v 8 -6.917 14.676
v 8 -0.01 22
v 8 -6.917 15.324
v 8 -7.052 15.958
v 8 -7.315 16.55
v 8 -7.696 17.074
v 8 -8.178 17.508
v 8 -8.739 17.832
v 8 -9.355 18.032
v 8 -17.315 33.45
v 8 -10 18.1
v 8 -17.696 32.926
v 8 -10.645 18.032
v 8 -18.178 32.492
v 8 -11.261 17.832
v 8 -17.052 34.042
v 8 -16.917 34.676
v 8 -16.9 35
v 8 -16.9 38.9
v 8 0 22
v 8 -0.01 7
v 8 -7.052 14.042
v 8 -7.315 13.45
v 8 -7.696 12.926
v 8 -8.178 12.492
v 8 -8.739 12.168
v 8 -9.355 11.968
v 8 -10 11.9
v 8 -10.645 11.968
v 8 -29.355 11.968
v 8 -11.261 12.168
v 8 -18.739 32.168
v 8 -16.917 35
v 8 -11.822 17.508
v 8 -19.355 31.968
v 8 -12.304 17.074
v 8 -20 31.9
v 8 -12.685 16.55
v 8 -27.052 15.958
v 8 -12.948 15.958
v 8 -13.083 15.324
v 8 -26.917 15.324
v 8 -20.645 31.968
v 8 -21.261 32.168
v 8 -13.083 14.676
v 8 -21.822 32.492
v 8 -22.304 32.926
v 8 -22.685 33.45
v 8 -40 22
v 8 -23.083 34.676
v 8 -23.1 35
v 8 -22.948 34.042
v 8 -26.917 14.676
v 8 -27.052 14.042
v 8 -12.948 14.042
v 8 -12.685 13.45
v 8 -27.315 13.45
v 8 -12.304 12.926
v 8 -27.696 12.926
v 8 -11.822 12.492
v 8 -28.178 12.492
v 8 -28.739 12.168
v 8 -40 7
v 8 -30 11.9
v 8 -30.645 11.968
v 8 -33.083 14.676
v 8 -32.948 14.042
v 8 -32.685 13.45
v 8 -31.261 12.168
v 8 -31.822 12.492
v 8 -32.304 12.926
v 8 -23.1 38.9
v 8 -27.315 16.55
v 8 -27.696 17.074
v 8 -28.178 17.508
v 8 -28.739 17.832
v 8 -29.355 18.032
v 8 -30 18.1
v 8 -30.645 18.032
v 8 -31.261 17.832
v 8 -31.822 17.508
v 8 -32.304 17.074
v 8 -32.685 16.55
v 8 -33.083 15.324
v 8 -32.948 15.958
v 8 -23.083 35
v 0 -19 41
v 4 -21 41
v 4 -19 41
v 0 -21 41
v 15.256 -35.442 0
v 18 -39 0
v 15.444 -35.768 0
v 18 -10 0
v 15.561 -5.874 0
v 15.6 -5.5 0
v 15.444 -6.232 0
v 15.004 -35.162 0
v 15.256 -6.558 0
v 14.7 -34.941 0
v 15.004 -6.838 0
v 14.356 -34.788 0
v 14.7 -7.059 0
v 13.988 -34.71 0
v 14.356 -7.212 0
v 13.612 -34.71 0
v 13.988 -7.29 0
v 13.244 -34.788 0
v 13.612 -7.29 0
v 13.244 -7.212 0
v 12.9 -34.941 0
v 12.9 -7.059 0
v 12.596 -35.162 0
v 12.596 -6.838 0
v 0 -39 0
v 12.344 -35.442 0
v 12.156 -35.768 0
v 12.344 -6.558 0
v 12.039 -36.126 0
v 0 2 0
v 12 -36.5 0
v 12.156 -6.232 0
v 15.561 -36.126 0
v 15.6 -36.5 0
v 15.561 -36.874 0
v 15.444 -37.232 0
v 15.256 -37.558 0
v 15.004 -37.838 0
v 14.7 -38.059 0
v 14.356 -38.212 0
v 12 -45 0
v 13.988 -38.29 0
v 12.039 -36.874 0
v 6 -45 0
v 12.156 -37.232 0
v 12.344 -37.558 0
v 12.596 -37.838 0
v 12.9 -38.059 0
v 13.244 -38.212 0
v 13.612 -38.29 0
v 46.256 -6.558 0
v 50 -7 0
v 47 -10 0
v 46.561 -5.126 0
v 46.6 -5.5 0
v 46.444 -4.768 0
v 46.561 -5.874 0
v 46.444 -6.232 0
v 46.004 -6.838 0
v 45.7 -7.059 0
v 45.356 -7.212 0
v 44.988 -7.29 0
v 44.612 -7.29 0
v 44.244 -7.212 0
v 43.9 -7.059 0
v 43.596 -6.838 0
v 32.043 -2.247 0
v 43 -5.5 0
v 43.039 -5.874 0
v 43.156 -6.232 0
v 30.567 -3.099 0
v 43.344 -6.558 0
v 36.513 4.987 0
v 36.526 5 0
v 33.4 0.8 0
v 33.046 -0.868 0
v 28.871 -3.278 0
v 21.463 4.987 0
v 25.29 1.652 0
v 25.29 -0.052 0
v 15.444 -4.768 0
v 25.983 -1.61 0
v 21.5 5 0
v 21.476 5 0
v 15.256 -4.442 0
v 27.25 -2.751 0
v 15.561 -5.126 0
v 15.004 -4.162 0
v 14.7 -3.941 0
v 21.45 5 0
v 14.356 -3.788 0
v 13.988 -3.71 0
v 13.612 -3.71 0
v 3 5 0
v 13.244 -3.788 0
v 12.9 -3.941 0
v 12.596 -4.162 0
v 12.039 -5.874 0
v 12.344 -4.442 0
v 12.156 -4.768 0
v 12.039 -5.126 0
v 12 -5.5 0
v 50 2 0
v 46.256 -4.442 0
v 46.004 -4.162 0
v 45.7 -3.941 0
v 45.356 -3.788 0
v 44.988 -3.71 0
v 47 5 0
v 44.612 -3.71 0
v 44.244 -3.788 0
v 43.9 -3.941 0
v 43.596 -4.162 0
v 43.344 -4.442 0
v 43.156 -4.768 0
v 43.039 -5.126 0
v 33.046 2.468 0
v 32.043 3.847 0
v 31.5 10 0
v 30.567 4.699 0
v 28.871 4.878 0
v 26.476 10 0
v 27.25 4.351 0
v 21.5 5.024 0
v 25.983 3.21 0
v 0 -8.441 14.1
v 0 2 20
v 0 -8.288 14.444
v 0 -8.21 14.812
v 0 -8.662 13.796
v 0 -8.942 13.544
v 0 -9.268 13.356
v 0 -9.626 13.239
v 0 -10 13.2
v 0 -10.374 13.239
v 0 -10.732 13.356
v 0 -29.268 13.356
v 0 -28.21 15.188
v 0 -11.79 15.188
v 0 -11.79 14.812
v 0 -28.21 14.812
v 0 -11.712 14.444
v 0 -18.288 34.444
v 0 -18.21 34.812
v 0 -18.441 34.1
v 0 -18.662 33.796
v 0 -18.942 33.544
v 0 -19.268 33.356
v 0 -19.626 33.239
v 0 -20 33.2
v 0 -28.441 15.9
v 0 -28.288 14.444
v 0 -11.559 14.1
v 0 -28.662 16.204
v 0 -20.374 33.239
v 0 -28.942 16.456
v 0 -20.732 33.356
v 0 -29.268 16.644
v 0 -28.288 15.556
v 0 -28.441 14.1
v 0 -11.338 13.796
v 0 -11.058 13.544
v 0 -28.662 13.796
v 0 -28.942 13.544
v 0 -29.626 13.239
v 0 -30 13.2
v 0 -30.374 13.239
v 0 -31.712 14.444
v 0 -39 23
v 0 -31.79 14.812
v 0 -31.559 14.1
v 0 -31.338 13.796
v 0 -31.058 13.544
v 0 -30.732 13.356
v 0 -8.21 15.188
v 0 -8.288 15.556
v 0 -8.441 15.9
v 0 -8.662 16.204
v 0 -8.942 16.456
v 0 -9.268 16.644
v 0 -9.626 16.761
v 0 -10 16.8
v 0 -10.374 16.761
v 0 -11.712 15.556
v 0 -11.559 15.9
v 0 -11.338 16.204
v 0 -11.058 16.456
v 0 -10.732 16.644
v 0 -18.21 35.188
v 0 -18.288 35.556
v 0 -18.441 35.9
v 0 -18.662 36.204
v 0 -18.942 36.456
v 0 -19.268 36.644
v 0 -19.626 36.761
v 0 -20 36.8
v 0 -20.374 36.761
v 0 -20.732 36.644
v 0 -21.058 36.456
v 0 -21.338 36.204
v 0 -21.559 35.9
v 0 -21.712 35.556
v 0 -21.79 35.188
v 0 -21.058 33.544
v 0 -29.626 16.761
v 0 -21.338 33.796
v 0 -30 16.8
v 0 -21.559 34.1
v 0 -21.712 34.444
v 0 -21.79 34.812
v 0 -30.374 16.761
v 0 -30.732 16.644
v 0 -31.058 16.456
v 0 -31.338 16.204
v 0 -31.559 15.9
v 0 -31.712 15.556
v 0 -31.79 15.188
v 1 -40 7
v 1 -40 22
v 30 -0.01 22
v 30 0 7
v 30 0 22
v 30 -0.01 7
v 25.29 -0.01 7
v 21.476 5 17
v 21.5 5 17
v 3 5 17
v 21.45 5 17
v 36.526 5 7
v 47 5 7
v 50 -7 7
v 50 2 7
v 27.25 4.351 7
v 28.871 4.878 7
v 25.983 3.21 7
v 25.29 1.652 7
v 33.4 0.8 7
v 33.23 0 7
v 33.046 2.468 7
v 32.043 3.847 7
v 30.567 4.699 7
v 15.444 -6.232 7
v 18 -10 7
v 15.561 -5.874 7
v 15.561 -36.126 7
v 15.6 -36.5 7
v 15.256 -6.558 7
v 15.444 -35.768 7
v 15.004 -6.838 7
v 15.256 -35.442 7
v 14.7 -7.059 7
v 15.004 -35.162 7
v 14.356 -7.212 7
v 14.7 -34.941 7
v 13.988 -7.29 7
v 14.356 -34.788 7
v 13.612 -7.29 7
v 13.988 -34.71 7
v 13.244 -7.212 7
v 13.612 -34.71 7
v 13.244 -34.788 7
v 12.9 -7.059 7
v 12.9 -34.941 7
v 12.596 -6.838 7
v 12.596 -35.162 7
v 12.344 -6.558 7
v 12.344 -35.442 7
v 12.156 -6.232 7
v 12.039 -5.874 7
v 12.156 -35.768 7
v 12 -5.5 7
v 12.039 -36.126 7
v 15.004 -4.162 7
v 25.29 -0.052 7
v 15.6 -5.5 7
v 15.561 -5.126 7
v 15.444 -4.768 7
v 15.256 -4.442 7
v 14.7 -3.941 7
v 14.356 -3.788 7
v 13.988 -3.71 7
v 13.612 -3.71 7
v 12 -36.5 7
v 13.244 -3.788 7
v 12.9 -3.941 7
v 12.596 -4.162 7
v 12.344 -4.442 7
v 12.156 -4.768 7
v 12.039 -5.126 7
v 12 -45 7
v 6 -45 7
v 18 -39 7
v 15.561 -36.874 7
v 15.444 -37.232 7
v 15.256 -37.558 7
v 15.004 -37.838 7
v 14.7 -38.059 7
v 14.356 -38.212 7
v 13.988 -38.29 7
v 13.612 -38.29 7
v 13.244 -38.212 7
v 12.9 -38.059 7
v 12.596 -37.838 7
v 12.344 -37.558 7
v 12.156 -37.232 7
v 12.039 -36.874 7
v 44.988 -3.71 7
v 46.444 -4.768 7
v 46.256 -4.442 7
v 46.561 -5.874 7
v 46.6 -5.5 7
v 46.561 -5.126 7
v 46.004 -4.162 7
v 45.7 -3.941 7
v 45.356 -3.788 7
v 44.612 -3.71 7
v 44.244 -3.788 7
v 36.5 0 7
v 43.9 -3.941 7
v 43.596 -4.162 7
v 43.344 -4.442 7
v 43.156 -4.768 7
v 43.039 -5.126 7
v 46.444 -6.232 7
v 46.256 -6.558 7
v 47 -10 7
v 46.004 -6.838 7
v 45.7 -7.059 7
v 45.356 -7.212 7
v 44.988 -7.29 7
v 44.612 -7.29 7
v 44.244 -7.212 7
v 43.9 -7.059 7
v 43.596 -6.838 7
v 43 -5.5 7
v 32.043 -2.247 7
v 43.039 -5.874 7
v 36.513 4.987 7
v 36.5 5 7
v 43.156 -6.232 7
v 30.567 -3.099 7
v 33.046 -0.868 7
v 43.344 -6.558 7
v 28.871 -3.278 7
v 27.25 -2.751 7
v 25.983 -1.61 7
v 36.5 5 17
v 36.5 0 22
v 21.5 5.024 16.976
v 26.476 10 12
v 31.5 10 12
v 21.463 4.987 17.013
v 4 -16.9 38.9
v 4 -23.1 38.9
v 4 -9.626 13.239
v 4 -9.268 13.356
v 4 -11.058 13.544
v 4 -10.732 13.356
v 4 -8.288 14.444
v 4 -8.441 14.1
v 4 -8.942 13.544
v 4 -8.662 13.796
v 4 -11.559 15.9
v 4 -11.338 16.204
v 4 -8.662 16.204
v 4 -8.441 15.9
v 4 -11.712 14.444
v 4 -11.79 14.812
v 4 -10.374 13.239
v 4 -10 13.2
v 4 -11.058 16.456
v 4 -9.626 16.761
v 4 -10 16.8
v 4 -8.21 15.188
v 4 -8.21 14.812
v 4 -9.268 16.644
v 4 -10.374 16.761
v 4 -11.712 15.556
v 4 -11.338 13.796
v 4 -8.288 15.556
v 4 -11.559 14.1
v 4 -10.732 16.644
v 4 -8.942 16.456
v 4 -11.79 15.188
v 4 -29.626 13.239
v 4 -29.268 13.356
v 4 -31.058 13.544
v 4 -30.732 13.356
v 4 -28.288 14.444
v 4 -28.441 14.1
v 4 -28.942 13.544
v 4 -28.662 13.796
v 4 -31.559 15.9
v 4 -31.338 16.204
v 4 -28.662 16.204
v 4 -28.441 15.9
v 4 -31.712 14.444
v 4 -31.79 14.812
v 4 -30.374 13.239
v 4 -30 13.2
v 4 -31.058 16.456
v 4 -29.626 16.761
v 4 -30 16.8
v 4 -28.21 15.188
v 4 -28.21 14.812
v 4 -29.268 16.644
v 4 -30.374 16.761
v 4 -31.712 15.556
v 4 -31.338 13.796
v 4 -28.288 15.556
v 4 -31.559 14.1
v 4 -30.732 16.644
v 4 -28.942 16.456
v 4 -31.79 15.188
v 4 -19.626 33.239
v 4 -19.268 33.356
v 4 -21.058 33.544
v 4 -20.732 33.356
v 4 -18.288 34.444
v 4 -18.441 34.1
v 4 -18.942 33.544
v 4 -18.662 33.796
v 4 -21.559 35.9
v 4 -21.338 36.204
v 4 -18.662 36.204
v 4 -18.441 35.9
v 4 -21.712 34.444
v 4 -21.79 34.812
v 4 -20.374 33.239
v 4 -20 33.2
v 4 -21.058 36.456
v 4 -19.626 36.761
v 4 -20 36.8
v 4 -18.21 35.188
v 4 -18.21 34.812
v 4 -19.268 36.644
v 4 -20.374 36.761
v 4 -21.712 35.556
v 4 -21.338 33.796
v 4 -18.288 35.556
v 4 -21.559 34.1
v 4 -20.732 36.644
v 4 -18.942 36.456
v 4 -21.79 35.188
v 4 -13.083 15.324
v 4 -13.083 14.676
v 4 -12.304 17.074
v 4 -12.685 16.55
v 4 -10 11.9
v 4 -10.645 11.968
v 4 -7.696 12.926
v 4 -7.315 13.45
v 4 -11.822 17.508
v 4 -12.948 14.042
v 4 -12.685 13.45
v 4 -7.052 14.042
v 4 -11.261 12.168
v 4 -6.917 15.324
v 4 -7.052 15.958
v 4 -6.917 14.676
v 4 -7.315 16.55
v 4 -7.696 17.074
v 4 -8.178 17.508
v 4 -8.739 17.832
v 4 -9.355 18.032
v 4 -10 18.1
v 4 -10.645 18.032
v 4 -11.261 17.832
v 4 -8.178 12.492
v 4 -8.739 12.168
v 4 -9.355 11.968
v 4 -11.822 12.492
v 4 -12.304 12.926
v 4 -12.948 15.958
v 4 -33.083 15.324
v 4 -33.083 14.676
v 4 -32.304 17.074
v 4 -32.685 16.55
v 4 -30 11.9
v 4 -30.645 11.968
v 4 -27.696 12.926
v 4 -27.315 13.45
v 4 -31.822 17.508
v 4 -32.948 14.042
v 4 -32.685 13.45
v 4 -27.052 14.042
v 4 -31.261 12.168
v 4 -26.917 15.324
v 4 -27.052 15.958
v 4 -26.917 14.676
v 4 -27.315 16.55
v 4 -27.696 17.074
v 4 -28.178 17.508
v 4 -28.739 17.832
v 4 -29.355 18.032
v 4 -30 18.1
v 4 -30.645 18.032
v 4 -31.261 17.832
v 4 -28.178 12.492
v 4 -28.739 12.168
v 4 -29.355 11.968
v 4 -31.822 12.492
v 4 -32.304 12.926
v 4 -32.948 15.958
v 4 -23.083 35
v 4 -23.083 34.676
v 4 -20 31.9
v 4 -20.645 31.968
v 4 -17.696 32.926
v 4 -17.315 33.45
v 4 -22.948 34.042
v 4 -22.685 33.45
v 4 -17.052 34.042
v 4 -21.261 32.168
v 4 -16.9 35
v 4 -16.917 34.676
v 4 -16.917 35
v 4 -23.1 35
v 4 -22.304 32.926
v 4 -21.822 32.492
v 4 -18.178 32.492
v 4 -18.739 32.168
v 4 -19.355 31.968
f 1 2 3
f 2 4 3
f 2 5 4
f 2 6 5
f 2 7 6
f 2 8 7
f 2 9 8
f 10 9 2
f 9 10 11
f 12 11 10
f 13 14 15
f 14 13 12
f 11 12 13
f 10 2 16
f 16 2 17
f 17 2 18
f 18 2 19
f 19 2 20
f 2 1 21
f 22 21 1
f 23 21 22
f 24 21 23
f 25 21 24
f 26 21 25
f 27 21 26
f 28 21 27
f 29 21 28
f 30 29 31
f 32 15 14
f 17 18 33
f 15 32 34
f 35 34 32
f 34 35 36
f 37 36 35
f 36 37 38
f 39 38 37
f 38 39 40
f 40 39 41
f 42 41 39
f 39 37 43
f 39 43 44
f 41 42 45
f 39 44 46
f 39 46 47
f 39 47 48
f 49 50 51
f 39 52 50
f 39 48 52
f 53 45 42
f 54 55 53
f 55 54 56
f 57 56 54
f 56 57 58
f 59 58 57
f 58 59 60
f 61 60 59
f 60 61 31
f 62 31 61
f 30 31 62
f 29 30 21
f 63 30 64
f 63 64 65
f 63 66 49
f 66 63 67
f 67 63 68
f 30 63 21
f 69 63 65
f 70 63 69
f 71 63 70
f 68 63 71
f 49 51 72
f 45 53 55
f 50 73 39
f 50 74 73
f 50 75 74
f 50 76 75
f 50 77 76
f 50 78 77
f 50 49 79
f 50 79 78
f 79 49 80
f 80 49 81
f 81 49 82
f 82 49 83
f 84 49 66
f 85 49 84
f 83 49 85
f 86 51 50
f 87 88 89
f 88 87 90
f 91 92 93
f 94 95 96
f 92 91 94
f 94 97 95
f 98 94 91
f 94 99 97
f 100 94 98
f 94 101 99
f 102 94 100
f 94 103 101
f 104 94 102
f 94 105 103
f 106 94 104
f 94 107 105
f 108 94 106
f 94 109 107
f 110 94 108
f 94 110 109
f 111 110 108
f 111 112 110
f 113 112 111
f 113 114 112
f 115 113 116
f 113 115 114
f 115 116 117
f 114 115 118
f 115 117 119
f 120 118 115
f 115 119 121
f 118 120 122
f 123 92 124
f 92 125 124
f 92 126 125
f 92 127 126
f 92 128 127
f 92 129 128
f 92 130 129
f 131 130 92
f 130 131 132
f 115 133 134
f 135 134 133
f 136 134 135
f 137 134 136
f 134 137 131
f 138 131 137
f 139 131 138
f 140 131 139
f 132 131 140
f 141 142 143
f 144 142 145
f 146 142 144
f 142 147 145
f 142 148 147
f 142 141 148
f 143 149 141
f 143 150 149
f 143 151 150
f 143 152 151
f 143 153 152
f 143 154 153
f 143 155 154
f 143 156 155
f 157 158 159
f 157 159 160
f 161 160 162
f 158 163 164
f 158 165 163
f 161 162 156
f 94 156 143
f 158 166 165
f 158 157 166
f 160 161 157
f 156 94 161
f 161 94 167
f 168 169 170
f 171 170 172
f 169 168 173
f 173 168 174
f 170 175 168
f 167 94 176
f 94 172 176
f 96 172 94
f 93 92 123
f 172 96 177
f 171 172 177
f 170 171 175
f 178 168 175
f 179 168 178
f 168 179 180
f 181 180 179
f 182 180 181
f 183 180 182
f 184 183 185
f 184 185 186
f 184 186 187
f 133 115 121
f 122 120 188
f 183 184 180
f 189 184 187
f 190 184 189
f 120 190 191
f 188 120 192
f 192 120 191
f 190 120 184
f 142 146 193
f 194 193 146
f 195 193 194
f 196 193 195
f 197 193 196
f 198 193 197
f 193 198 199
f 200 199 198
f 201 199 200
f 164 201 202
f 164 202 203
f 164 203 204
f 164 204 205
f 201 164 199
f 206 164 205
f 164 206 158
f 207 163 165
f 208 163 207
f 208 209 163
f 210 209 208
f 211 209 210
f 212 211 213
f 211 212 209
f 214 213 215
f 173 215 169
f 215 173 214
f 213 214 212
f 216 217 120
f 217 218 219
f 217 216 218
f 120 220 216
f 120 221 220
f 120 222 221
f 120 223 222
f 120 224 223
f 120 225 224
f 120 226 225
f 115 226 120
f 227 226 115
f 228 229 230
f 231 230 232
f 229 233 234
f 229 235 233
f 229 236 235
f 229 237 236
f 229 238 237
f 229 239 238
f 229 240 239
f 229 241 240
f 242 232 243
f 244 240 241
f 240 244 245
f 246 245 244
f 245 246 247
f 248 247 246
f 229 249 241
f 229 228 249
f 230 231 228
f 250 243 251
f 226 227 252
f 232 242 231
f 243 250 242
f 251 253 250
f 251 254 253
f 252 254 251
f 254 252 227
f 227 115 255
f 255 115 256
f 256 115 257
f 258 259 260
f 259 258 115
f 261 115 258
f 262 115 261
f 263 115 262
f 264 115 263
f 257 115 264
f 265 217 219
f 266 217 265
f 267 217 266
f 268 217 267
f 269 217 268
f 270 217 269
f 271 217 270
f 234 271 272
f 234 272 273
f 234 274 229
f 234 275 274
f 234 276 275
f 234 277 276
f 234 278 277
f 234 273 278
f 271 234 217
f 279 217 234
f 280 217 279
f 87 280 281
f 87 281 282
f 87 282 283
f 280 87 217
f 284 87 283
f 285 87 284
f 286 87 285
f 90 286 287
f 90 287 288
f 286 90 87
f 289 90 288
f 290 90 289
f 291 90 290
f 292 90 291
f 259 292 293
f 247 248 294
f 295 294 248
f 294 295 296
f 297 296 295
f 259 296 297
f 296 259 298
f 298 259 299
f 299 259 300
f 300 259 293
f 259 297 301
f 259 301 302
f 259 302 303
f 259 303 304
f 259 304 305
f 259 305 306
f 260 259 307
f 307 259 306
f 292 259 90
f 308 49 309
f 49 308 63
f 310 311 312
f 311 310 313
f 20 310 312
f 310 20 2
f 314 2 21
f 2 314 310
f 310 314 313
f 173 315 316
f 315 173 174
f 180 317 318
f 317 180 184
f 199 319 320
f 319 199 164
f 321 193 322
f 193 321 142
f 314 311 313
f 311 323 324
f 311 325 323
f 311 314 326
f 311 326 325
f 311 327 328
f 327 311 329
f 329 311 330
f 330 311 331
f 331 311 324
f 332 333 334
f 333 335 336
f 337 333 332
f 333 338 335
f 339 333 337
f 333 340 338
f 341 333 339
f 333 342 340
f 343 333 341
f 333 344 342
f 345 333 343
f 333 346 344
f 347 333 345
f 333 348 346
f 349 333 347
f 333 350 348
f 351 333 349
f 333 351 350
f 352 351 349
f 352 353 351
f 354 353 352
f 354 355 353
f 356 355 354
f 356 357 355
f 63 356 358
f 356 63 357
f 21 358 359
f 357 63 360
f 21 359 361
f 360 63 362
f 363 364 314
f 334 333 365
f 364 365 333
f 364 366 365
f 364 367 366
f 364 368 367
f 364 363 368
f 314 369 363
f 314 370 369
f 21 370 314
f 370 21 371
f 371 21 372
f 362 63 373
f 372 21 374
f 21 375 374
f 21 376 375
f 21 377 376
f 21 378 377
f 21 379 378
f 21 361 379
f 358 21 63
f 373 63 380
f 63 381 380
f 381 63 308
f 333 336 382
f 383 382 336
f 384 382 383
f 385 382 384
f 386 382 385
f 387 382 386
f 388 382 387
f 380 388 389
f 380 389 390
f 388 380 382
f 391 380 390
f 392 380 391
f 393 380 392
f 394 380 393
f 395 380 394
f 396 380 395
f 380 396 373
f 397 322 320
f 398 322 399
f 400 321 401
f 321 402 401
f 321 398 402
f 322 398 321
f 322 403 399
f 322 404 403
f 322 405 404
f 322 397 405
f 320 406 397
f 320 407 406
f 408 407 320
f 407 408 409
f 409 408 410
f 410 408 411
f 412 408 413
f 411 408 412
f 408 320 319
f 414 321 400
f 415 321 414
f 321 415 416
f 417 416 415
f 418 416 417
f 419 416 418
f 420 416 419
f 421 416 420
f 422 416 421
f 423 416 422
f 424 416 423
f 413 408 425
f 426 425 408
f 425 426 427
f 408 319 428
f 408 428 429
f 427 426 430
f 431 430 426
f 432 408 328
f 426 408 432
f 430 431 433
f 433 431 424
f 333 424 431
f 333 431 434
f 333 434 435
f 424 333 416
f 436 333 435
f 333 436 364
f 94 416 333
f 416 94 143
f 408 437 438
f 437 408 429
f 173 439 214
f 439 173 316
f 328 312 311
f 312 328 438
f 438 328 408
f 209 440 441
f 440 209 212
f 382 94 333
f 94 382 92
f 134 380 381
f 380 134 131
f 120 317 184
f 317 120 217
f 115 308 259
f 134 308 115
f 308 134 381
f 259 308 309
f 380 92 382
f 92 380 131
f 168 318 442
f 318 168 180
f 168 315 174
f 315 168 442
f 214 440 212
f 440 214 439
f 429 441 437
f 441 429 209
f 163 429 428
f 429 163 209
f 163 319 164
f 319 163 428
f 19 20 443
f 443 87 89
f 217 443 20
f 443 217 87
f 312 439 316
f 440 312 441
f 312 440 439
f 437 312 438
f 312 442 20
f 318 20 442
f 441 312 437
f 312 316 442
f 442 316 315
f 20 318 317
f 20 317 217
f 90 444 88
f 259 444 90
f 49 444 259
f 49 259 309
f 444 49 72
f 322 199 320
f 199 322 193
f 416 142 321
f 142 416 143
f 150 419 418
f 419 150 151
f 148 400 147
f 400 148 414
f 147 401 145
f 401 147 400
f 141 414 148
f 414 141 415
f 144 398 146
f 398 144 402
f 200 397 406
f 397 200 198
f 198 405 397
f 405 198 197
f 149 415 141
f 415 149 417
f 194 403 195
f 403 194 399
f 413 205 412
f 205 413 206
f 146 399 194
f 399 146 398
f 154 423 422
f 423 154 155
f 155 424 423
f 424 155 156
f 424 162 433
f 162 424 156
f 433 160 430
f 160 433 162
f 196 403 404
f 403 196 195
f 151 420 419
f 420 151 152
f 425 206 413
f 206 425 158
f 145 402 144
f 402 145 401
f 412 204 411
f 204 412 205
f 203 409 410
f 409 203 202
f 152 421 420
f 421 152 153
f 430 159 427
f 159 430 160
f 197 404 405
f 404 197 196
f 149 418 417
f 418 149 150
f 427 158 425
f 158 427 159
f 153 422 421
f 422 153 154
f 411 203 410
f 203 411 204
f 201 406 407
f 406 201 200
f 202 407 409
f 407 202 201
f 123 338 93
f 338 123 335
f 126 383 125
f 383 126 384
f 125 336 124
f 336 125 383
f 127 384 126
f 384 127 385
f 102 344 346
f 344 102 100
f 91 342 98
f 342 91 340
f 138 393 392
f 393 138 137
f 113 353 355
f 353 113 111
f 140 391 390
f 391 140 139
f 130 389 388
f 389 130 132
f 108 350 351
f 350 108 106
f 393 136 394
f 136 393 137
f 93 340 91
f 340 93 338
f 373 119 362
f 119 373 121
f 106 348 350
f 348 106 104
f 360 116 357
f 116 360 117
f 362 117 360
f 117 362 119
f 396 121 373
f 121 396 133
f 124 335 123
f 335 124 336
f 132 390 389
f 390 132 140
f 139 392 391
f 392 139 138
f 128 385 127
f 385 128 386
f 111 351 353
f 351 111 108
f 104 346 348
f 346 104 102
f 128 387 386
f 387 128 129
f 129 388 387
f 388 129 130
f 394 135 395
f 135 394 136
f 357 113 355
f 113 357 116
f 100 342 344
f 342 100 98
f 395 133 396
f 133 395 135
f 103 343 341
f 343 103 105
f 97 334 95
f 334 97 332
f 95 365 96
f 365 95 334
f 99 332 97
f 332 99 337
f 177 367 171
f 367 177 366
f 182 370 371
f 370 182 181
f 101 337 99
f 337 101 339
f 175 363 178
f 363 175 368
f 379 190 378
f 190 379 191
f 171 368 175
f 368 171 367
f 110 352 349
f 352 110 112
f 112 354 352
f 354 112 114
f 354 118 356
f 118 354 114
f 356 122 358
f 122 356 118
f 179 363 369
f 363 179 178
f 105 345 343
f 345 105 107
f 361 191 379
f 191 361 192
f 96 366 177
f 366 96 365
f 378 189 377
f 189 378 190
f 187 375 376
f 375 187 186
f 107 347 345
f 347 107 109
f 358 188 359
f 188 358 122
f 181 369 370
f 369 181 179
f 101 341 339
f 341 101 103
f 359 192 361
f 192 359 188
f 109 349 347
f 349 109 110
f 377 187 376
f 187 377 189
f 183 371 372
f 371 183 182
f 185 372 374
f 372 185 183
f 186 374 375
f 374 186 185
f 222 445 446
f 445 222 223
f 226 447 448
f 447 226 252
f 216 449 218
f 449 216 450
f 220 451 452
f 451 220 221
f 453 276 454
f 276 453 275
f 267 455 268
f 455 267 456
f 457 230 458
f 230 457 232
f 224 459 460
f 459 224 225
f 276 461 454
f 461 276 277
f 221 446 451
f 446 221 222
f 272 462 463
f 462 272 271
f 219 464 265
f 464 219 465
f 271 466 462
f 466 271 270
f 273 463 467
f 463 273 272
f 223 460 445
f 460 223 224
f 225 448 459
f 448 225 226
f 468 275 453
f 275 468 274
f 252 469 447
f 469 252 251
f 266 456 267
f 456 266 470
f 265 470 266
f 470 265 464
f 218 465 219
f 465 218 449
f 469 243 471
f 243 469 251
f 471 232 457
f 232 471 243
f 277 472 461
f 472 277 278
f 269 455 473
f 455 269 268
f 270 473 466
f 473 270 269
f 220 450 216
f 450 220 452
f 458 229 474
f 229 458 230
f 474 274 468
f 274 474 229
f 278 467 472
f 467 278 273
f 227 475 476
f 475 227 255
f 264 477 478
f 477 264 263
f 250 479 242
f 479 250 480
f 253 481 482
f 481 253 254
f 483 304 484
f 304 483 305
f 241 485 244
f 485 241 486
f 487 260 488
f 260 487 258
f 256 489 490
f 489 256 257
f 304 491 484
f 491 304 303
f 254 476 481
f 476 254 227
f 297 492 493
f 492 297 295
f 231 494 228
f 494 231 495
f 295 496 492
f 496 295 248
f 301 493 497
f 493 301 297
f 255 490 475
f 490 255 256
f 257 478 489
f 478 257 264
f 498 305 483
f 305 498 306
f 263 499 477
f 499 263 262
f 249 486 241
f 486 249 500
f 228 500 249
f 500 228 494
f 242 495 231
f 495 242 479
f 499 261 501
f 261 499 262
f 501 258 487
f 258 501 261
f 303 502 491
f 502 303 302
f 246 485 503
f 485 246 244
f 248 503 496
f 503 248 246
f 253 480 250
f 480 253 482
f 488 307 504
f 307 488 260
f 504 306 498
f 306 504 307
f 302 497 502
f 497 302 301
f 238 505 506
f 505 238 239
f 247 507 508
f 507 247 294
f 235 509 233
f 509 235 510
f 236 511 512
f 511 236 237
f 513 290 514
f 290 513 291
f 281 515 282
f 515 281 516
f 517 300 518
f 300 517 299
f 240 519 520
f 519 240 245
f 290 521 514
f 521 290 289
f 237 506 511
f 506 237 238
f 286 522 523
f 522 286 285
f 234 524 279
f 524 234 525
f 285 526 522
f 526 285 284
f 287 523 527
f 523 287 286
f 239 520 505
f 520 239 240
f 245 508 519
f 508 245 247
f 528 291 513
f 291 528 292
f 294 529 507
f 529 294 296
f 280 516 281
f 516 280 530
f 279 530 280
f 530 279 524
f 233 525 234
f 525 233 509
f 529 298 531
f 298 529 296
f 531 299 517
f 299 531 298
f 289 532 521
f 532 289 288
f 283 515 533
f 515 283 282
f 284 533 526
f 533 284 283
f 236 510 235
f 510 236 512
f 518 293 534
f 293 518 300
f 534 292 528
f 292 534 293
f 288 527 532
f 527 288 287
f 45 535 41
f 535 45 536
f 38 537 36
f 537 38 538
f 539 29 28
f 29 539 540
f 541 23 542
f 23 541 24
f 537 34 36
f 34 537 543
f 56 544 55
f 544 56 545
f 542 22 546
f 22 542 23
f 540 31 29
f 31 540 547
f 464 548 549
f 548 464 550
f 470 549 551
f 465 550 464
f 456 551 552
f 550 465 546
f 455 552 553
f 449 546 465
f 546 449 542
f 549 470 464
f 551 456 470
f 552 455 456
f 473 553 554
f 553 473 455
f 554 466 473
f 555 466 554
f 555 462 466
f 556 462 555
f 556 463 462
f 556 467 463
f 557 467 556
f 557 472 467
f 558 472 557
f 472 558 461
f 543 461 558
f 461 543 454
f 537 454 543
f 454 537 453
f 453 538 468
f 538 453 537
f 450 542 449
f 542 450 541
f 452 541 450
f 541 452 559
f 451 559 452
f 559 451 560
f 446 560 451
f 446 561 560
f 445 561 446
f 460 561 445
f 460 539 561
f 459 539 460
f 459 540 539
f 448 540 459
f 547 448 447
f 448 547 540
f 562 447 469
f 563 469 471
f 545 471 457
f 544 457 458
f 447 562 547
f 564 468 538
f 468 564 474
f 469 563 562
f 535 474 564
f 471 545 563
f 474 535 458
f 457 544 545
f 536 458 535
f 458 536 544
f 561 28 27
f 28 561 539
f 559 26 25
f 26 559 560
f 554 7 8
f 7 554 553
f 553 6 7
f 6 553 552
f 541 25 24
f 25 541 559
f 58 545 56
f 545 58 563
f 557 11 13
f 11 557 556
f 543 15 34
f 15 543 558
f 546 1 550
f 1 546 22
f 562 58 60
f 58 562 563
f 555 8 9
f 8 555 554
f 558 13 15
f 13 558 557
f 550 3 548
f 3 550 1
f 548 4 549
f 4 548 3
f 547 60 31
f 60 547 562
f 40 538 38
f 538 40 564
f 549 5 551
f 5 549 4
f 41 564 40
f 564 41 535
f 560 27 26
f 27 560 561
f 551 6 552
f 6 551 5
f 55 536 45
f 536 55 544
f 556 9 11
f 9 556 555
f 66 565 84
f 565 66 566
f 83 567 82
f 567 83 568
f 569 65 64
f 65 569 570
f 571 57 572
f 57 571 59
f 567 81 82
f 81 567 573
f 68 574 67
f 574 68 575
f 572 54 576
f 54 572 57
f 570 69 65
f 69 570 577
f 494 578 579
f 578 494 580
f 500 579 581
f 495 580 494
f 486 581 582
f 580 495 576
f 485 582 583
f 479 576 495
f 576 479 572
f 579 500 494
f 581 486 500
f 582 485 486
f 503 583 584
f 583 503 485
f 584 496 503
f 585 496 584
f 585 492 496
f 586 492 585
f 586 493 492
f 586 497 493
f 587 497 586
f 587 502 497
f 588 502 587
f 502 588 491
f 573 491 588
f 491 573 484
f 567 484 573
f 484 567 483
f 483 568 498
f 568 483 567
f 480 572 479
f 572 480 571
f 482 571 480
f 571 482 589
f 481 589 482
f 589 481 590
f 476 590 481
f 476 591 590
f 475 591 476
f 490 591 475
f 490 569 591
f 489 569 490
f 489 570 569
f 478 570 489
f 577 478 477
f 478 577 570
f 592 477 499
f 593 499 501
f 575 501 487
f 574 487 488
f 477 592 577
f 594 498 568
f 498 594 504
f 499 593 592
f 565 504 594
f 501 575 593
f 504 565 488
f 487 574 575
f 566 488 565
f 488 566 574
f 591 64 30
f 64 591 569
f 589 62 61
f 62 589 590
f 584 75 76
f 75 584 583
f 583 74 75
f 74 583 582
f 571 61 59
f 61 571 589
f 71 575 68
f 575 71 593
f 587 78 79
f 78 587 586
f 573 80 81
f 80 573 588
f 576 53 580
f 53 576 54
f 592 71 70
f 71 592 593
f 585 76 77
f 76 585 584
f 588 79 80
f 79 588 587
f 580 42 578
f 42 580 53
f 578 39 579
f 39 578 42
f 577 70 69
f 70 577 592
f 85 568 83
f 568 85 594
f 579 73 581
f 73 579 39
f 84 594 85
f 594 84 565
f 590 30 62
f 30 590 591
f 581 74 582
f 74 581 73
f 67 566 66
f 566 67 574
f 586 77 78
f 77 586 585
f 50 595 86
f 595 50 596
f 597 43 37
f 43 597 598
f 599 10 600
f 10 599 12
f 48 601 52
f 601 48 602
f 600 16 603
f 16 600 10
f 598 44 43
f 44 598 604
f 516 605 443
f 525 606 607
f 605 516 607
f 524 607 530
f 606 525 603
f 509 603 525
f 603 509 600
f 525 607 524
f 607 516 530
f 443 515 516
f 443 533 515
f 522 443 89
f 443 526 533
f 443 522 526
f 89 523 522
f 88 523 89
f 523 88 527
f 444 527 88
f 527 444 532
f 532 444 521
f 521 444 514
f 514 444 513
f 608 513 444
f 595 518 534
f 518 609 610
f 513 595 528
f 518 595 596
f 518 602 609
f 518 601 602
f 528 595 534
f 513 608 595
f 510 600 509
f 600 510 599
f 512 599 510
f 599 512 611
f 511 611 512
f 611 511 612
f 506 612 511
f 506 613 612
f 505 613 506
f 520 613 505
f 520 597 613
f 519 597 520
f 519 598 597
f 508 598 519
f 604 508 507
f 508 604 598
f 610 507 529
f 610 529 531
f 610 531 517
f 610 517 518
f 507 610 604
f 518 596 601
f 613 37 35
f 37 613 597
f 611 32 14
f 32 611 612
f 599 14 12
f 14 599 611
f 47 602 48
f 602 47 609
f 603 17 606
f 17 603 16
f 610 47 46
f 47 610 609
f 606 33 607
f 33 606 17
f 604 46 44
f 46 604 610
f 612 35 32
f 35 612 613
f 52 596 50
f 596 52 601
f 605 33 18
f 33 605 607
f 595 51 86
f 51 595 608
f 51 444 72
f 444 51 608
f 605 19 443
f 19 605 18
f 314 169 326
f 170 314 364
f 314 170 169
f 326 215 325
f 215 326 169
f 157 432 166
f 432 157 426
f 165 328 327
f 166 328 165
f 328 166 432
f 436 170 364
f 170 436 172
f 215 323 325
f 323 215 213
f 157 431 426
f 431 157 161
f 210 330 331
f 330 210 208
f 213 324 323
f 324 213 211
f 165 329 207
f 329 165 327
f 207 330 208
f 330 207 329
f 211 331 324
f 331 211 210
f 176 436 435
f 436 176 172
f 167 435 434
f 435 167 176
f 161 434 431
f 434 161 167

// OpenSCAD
// PRUSA iteration3
// Z axis bottom holder
// GNU GPL v3
// Josef Průša <iam@josefprusa.cz> and contributors
// http://www.reprap.org/wiki/Prusa_Mendel
// http://prusamendel.org

module z_bottom_base(){
 translate([0,0,0]) cube([8,40,16+25]); // plate touching the base
 translate([0,-5,0]) cube([30,5.01,22]); // plate touching the base
 translate([0,-5,0]) cube([50,15,7]); // Zrod
 translate([21.5,-10,0]) cube([15,10,30]);// Zrod addition
 translate([0,-5,0]) cube([18,50,7]);
}

module z_bottom_fancy(){
 // corner cutouts
 translate([0.5,-2.5,0]) rotate([0,0,-45-180]) translate([-20,0,-1]) cube([50,30,51]);
 translate([0.5,40-0.5,0]) rotate([0,0,-45+90]) translate([-15,0,-1]) cube([30,30,51]);
 translate([-4+11,40+5+5,0]) rotate([0,0,-45-0]) translate([0,0,-1]) cube([30,30,51]);

 translate([-15.3+15.55,-30+3.8,0]) rotate([0,0,-45-0]) translate([0,0,-1]) cube([30,30,51]);//mycut
 translate([15.3,-30+3.8,0]) rotate([0,0,-45-0]) translate([0,0,-1]) cube([30,30,51])


 translate([8,0,12+20+6]) rotate([0,-90,0]) translate([0,-5,0]) cube([30,50,30]);
 translate([40,-2,12+8]) rotate([45,0,0]) rotate([0,-90,0]) translate([0,-20,0]) cube([30,60,50]);
 translate([8,20,12+30]) rotate([-45,0,0]) rotate([0,-90,0]) translate([0,-5,0]) cube([30,50,30]);
 translate([50-2.5,-7+2.5,0]) rotate([0,0,-45-90]) translate([-15,0,-1]) cube([30,30,51]);
 translate([50-1.5,10-1.5,0]) rotate([0,0,-45]) translate([-15,0,-1]) cube([30,30,51]);
 // Stiffner cut out
 //translate([30,0,5.5]) rotate([0,-45,0]) translate([0,-5,0]) cube([30,50,30]);
}

module z_bottom_holes(){
 // Frame mounting screw holes
 translate([-1,10,10+5]) rotate([0,90,0]) cylinder(h = 20, r=1.8, $fn=30);
 translate([-1,10+20,10+5]) rotate([0,90,0]) cylinder(h = 20, r=1.8, $fn=30);
 translate([-1,10+10,10+20+5]) rotate([0,90,0]) cylinder(h = 20, r=1.8, $fn=30);

 // Frame mounting screw head holes
 translate([4,10,10+5]) rotate([0,90,0]) cylinder(h = 20, r=3.1, $fn=30);
 translate([4,10+20,10+5]) rotate([0,90,0]) cylinder(h = 20, r=3.1, $fn=30);
 translate([4,10+10,10+20+5]) rotate([0,90,0]) cylinder(h = 20, r=3.1, $fn=30);
 translate([4,10+10-3.1,10+20+5]) cube([10,6.2,10]);

 // Z rod holder
 translate([25+4.3,4.2-5,-1]) rotate([0,0,0]) cylinder(h = 8, r=4.1, $fn=15);
 //translate([25+4.3-1,3,0.6]) cube([2,10,7]); // it's bit up because it helps with printing

 // motor mounting
 translate([25+4.3,21,-1]){
 translate([15.5,15.5,-1]) cylinder(h = 20, r=1.8, $fn=30);
 
 translate([15.5,-15.5,-1]) cylinder(h = 20, r=1.8, $fn=30);
 translate([-15.5,15.5,-1]) cylinder(h = 20, r=1.8, $fn=30);
 translate([-15.5,-15.5,-1]) cylinder(h = 20, r=1.8, $fn=30);
 }

}

// Final part
module z_bottom_holder(){
 difference(){
  z_bottom_base();
  z_bottom_fancy();
  z_bottom_holes();
 }
}

//z_bottom_holder();
mirror([0,1,0]) z_bottom_holder();
